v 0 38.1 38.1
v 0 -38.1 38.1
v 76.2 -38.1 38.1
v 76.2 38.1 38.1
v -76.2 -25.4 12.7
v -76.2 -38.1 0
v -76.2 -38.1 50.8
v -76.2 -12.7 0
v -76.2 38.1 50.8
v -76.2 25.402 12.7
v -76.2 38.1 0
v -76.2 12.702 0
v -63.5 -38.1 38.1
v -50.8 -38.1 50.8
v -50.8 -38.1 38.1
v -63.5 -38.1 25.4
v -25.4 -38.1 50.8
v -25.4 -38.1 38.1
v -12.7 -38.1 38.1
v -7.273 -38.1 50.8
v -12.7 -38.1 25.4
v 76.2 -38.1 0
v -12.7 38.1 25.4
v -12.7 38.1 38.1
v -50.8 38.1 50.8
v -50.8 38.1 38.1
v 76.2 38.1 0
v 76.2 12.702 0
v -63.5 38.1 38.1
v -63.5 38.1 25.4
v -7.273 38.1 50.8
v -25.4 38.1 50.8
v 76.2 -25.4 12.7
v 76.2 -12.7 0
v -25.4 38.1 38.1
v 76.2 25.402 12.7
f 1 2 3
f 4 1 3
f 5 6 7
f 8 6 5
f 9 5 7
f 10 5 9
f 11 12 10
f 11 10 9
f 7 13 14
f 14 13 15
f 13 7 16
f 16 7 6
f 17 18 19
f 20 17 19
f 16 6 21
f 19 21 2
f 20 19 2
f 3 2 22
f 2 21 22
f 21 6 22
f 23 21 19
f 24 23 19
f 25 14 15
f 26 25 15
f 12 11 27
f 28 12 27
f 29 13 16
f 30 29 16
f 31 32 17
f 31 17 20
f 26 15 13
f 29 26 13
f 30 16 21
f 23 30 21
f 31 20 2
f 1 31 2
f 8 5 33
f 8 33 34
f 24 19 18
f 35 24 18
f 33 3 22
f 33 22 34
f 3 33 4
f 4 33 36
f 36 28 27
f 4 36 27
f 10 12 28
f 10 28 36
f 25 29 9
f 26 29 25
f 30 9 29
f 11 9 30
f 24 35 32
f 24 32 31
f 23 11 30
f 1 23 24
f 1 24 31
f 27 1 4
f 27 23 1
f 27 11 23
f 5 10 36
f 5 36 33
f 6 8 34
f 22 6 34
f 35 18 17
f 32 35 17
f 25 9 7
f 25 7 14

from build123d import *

# Parameters (mm, degrees)
F0_W     = 152.4
F0_H     = 76.2
F1_DEPTH = 50.8
F3_DEPTH = 152.401
F5_DEPTH = 76.201
F6_W     = 76.2
F6_H     = 12.7
F7_DEPTH = 76.201


with BuildPart() as f1:
    # F0 (on Top) → F1 (new body)
    with BuildSketch(Plane.XY):
        Rectangle(F0_W, F0_H)
    extrude(amount=F1_DEPTH)

    # F2 (on face) → F3 (cut, through all)
    with BuildSketch(Plane.YZ.offset(76.2)):
        Polygon((25.40207, 12.7), (-25.4, 12.7), (-12.7, 0), (12.70207, 0), align=None)
    extrude(amount=-F3_DEPTH, mode=Mode.SUBTRACT)

    # F4 (on face) → F5 (cut, through all)
    with BuildSketch(Plane.XZ.offset(38.1)):
        Polygon((-25.4, 50.8), (-50.8, 50.8), (-50.8, 38.1), (-63.5, 38.1), (-63.5, 25.4), (-12.7, 25.4), (-12.7, 38.1), (-25.4, 38.1), align=None)
    extrude(amount=-F5_DEPTH, mode=Mode.SUBTRACT)

    # F6 (on face) → F7 (cut, through all)
    with BuildSketch(Plane.XZ.offset(38.1)):
        with Locations((38.1, 44.45)):
            Rectangle(F6_W, F6_H)
        Polygon((0, 38.1), (0, 50.8), (-7.272681, 50.8), align=None)
    extrude(amount=-F7_DEPTH, mode=Mode.SUBTRACT)


solid = f1.part
